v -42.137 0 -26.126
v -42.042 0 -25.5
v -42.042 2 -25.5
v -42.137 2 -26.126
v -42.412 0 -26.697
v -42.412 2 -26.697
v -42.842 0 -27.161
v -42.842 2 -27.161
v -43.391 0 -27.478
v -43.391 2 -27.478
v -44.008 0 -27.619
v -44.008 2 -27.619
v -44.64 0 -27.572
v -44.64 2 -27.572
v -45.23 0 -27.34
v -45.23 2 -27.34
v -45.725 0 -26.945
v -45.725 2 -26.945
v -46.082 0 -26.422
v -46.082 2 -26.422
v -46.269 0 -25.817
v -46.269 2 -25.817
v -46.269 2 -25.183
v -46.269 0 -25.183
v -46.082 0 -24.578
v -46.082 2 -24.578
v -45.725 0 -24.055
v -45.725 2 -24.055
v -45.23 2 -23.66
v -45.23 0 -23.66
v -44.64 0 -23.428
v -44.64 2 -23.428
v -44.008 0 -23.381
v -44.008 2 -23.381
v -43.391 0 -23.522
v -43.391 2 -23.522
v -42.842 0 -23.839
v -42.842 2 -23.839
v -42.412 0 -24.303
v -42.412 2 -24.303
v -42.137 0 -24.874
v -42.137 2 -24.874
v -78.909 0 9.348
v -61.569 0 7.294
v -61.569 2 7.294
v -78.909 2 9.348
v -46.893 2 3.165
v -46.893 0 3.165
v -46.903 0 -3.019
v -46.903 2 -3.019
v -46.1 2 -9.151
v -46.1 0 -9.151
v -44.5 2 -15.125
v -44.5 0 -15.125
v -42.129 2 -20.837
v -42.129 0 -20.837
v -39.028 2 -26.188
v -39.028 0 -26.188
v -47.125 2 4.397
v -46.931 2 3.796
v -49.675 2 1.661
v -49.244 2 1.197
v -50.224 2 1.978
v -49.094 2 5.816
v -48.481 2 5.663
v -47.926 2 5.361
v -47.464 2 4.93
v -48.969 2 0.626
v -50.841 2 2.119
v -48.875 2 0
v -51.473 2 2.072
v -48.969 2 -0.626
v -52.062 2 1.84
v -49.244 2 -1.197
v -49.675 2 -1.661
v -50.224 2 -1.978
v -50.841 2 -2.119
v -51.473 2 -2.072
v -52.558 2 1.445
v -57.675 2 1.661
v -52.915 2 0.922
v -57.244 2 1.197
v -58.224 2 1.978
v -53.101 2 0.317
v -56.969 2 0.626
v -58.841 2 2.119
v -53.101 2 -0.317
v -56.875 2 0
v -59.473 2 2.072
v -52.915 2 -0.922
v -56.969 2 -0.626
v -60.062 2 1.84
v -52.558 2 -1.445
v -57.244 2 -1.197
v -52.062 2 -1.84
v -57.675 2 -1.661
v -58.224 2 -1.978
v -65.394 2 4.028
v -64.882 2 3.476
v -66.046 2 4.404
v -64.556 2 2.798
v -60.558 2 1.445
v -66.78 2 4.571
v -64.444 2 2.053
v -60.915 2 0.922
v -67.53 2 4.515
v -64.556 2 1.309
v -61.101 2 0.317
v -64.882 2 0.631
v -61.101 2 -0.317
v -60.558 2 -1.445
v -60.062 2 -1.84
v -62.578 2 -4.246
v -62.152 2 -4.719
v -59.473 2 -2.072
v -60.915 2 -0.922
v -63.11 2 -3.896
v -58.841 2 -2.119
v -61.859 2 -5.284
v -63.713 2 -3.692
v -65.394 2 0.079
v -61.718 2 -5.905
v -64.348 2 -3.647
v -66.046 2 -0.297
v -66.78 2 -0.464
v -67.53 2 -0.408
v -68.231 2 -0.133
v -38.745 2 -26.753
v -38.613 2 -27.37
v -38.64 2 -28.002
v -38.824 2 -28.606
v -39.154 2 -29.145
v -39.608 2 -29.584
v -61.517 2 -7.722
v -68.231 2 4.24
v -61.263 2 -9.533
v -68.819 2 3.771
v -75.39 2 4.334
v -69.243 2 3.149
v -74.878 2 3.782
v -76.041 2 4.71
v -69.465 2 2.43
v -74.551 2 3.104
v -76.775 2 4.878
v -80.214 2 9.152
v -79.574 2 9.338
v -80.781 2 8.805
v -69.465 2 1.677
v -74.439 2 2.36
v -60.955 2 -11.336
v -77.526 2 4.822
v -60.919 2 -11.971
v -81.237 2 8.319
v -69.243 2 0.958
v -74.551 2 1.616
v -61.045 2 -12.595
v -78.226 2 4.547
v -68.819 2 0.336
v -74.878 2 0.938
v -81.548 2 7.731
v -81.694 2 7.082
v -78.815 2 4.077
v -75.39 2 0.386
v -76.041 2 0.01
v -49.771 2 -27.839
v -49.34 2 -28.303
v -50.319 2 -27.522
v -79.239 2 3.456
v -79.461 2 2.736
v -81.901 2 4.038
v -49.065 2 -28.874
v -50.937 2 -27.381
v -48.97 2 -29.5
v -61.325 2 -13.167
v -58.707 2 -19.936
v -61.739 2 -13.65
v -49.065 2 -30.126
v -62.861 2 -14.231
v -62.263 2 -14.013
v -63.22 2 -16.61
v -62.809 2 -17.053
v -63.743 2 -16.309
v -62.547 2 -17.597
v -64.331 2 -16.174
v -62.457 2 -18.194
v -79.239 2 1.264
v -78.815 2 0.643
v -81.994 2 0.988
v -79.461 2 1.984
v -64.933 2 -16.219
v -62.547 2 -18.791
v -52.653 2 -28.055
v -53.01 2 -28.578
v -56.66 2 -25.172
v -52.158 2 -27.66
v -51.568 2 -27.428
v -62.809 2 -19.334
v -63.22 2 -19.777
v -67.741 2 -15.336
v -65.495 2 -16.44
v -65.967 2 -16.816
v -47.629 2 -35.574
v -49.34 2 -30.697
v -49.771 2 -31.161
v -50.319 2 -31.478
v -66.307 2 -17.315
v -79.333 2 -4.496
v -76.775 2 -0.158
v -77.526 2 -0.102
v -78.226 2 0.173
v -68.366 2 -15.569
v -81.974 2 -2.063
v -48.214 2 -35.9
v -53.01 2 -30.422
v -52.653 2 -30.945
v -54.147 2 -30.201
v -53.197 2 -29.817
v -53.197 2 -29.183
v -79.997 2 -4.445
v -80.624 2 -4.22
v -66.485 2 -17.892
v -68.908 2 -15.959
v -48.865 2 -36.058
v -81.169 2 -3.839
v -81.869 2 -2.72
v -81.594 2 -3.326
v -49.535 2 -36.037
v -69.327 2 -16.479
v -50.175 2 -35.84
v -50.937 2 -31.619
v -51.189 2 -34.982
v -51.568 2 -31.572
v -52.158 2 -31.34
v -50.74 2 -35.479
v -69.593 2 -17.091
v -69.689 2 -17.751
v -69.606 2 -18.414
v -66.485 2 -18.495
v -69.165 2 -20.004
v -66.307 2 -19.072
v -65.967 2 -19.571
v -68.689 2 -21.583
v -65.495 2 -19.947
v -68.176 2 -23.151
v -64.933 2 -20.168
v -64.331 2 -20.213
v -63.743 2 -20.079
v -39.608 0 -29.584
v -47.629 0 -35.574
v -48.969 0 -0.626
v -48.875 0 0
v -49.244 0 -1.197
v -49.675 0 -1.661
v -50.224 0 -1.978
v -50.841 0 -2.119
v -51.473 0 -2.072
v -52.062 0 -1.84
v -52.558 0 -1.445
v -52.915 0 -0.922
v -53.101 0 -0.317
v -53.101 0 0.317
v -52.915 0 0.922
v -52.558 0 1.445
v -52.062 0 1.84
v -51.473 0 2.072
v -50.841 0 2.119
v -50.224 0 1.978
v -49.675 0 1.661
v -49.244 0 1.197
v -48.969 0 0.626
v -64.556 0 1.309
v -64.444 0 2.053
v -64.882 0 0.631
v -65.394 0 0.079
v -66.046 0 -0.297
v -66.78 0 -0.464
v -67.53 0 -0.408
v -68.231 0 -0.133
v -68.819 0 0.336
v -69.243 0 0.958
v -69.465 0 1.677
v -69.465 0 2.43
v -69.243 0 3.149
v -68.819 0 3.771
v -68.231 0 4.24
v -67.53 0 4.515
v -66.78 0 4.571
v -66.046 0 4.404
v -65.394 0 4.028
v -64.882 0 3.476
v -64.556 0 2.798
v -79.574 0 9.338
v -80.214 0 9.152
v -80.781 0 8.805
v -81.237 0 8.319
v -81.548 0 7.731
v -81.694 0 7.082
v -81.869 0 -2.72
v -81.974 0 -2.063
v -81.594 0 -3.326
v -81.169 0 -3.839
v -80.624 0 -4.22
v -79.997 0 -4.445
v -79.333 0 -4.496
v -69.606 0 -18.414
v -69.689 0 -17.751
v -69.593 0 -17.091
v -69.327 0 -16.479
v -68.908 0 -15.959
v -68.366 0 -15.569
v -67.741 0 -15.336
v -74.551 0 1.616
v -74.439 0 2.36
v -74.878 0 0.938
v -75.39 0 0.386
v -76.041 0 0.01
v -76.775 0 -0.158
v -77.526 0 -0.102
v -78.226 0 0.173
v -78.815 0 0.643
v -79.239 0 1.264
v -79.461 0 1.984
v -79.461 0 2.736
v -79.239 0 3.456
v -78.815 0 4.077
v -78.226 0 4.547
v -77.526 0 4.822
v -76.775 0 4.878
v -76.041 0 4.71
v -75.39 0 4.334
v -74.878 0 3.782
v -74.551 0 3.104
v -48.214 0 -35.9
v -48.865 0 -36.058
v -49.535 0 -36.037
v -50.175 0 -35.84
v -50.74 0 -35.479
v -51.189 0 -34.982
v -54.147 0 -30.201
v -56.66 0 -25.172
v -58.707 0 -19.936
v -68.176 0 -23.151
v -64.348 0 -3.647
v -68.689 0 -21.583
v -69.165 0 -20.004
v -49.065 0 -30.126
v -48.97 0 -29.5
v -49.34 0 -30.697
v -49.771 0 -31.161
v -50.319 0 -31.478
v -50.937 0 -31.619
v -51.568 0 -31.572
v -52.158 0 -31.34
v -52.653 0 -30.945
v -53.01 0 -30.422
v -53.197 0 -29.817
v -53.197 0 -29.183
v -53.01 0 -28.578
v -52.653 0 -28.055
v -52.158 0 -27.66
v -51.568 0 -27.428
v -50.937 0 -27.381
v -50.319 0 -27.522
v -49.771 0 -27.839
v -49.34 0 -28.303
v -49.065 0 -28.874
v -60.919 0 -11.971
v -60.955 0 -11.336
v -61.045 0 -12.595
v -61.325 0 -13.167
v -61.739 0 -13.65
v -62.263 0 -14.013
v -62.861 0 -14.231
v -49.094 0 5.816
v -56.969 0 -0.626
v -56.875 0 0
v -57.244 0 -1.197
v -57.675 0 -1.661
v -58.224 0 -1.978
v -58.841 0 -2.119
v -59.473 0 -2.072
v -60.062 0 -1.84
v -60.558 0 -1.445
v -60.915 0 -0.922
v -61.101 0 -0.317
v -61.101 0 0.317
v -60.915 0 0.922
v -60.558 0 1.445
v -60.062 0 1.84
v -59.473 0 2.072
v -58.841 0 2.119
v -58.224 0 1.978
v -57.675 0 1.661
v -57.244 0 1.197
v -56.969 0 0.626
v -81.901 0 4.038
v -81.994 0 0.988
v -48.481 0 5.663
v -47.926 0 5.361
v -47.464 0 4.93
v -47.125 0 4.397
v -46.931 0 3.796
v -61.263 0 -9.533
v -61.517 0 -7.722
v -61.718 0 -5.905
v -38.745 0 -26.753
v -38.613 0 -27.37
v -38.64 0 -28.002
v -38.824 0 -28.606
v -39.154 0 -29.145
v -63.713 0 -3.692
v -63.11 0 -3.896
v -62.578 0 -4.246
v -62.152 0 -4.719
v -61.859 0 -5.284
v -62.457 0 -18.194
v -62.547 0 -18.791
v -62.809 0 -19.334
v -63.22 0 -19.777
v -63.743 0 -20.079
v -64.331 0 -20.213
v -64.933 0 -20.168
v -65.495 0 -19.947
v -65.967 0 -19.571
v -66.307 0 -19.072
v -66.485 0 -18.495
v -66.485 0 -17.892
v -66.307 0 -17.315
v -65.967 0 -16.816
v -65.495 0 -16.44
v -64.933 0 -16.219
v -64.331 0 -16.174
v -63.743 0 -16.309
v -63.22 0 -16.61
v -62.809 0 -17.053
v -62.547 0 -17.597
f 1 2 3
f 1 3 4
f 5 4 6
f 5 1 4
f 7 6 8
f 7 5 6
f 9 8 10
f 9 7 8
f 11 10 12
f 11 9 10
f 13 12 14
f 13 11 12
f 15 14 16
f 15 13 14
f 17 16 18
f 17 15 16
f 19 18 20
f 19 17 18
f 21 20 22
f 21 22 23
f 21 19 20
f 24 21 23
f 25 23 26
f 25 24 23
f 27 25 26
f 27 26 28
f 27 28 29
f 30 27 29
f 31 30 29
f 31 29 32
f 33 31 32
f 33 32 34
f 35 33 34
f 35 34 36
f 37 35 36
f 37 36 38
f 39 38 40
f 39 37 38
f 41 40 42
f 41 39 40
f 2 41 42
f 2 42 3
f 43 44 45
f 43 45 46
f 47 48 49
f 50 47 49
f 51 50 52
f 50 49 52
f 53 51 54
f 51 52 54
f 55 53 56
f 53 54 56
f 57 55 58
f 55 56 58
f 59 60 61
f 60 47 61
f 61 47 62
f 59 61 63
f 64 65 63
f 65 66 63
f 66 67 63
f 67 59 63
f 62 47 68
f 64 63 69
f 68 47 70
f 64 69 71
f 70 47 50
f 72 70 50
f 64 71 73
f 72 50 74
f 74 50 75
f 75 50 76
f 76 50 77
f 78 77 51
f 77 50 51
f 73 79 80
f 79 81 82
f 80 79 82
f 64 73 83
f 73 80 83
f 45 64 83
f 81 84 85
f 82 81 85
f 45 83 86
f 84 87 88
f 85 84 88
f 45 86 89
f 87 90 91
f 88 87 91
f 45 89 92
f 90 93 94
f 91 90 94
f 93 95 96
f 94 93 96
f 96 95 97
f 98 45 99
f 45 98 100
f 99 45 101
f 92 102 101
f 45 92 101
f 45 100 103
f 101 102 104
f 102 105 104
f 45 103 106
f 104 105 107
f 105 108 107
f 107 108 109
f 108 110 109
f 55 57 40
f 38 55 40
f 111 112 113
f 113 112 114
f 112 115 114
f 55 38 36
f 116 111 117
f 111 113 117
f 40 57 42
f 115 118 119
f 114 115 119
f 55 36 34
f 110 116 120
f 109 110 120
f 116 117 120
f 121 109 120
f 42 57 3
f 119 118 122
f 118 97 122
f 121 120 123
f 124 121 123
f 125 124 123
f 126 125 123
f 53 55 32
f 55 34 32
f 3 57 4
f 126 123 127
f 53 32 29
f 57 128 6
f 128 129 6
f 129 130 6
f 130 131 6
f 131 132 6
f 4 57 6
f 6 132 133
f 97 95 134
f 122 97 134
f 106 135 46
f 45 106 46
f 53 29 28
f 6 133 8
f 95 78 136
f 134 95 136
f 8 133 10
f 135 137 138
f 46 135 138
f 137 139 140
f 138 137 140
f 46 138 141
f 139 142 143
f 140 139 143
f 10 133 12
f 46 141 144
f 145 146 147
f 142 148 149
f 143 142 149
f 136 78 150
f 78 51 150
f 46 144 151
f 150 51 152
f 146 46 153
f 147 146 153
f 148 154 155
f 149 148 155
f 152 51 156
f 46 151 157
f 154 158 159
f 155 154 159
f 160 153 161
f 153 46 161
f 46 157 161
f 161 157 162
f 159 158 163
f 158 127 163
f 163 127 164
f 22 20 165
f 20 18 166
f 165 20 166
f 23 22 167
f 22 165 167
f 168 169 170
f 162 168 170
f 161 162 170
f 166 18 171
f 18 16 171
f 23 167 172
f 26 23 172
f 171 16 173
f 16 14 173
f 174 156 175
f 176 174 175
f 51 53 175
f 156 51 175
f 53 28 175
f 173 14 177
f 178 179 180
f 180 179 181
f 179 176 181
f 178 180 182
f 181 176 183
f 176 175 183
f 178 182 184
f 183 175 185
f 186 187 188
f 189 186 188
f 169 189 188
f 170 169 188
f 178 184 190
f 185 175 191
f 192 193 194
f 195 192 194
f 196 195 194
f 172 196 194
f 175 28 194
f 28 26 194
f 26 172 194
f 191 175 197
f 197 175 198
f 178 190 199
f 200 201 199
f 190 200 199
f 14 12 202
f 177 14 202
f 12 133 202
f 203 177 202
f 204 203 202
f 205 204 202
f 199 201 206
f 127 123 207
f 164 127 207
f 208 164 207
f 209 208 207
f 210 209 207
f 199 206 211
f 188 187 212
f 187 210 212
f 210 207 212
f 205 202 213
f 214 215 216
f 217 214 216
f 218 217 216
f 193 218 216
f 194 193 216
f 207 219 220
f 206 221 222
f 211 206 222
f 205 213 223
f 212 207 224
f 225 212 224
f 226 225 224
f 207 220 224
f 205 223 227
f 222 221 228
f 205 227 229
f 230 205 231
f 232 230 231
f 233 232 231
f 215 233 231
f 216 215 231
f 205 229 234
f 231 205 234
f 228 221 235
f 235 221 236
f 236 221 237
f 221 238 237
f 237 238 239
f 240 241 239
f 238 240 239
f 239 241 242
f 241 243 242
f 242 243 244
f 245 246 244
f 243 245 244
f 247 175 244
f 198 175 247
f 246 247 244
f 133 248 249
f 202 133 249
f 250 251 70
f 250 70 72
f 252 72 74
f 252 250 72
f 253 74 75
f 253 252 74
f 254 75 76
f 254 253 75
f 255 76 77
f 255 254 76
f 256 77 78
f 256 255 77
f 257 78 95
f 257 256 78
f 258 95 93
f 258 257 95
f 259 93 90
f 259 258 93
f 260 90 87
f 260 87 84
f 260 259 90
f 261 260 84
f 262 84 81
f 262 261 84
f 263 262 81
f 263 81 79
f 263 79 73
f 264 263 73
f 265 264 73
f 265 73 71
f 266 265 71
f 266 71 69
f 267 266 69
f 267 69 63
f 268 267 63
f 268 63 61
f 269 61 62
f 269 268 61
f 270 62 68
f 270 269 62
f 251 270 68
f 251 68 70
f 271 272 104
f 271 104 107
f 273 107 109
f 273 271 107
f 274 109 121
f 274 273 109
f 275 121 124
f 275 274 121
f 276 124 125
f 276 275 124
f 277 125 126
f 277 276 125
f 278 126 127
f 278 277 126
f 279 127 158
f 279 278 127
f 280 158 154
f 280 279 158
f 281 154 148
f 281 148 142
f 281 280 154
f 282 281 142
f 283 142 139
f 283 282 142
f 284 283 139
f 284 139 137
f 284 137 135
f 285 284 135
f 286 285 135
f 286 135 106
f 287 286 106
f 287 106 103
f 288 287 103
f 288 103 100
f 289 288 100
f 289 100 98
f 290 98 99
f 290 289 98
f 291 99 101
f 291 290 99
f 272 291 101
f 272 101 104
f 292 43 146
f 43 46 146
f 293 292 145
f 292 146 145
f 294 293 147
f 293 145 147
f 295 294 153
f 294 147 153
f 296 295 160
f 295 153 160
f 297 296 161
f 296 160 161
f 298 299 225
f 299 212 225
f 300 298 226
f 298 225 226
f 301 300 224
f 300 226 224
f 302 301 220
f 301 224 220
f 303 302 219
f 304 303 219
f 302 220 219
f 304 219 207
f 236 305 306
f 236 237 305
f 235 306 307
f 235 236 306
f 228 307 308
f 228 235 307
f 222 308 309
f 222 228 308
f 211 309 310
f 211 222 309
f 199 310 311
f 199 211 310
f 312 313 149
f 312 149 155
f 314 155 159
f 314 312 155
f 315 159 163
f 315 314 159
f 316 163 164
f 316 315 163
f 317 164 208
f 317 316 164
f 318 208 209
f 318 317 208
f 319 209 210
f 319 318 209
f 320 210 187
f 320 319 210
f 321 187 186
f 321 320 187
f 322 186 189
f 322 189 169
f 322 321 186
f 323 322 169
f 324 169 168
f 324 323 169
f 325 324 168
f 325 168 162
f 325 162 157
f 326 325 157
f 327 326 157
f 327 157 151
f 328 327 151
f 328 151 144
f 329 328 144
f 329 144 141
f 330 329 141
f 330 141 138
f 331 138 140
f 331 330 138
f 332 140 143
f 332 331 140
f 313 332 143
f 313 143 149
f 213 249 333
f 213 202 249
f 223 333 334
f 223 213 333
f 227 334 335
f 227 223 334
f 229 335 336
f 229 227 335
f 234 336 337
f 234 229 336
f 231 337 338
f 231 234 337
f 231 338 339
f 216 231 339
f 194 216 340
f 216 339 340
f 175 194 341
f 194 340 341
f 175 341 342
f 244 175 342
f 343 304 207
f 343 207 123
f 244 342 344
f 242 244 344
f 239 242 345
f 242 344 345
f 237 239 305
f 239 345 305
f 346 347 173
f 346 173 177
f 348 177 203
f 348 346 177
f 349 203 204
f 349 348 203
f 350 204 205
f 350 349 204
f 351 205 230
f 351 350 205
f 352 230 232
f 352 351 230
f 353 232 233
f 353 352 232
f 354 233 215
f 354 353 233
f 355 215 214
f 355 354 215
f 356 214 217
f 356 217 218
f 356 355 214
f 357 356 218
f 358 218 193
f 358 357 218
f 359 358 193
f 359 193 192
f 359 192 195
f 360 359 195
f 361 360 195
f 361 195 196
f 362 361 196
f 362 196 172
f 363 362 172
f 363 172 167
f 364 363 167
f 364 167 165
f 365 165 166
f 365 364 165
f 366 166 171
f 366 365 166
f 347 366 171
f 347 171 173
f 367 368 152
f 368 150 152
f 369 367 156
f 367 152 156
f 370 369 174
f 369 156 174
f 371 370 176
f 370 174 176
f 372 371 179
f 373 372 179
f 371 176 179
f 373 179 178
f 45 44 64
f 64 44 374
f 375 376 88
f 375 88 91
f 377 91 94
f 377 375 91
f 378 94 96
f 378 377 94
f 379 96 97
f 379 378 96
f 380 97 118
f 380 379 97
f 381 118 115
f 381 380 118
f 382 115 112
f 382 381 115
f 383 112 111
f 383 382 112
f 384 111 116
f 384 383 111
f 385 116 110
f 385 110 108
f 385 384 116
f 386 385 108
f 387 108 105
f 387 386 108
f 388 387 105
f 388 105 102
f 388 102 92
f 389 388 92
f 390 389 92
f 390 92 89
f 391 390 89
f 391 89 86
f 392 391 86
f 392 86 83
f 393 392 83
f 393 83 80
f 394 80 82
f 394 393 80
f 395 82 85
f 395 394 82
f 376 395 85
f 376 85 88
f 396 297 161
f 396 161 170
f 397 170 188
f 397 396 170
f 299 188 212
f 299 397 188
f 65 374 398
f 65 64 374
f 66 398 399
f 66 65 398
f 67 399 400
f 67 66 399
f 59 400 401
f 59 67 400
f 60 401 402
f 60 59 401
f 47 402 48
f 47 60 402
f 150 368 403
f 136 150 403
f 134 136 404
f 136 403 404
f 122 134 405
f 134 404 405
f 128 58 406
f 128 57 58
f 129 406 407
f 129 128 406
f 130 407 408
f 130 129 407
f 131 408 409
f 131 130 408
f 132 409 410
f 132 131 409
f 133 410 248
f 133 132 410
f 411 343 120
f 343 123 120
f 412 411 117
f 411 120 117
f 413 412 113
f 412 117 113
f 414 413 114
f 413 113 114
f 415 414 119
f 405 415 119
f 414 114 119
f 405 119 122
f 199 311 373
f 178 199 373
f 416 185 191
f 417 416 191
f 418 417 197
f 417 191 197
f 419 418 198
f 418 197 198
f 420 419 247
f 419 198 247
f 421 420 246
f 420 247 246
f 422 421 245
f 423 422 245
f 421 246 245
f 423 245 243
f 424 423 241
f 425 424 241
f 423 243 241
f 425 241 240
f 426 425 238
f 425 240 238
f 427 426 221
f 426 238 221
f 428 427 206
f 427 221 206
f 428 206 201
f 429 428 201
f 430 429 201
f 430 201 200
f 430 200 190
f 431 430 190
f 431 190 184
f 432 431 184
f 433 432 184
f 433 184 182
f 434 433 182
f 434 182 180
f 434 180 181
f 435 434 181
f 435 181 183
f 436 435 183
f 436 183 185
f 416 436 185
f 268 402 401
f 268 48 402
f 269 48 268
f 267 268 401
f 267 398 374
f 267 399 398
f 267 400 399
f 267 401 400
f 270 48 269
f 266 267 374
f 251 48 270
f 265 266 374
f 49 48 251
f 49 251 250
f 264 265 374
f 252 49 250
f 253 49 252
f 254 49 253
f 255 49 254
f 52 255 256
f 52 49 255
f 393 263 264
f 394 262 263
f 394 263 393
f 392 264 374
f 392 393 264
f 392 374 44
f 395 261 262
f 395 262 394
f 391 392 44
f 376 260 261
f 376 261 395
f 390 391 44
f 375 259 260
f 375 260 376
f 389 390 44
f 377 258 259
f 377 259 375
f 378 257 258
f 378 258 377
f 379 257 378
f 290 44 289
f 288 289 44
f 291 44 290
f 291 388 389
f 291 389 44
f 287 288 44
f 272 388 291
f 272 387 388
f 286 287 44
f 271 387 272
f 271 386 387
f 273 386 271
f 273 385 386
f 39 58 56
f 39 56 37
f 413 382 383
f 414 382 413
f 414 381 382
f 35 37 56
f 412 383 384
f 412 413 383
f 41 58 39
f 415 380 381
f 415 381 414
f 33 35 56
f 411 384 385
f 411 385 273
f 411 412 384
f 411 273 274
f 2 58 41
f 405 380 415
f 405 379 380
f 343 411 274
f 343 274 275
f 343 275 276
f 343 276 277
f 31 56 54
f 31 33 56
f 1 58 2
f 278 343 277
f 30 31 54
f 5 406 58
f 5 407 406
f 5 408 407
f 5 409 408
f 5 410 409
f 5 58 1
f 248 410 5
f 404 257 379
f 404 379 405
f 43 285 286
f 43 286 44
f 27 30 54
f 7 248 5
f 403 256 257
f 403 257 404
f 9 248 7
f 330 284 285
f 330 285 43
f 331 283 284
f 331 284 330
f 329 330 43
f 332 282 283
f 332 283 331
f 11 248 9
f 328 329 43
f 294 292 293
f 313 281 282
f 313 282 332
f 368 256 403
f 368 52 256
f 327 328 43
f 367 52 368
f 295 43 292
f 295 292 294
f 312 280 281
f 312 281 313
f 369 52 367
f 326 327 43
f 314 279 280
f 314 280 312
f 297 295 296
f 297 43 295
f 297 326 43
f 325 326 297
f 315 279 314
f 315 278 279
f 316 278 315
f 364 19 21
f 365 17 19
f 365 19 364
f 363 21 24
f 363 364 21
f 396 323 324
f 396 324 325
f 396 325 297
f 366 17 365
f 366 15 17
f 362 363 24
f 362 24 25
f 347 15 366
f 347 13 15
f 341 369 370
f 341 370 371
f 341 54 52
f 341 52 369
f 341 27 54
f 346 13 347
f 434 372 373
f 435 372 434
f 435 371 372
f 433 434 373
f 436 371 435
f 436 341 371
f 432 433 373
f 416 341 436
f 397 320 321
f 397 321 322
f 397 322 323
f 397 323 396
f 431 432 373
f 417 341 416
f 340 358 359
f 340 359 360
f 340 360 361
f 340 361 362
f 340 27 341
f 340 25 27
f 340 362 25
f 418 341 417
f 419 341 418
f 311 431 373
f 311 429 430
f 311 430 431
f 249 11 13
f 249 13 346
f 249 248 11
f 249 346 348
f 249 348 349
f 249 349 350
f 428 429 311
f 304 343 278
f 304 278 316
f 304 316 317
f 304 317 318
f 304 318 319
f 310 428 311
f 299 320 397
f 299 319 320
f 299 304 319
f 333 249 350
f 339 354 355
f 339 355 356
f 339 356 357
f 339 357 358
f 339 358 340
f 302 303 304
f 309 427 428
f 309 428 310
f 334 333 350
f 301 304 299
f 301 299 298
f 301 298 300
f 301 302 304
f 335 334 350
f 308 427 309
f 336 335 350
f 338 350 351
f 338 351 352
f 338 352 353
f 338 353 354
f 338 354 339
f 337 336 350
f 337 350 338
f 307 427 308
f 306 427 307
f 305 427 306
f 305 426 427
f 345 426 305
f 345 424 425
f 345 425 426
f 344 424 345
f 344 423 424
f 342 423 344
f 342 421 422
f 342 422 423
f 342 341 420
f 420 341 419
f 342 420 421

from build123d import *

# Parameters (mm, degrees)
SKETCH1_R               = 2.125
BOSS_EXTRUDE1_DEPTH     = 2
BOSS_EXTRUDE3_DEPTH     = 2
SKETCH4_R               = 2.025
CUT_EXTRUDE1_DEPTH      = 1
CUT_EXTRUDE1_DEPTH_BACK = 3
SKETCH6_R               = 2.525
BOSS_EXTRUDE4_DEPTH     = 2
FILLET1_R               = 2.5


with BuildPart() as part:
    # Sketch1 → Boss-Extrude1 (new body)
    with BuildSketch(Plane(origin=(0, 0, 0), x_dir=(1, 0, 0), z_dir=(0, 1, 0))):
        with BuildLine():
            Line((-37.655823606, 28.125414637), (-49.673639651, 37.101610798))
            ThreePointArc((-49.673639651, 37.101610798), (-59.88740123, 16.046780796), (-61.569439235, -7.294117647))
            Line((-61.569439235, -7.294117647), (-46.673607162, -5.529411765))
            ThreePointArc((-46.673607162, -5.529411765), (-45.398513836, 12.16449512), (-37.655823606, 28.125414637))
        make_face()
        with Locations((-44.167295593, 25.5)):
            Circle(SKETCH1_R, mode=Mode.SUBTRACT)
        with Locations((-51.095498823, 29.5)):
            Circle(SKETCH1_R, mode=Mode.SUBTRACT)
        with Locations((-59, 0)):
            Circle(SKETCH1_R, mode=Mode.SUBTRACT)
        with Locations((-51, 0)):
            Circle(SKETCH1_R, mode=Mode.SUBTRACT)
    extrude(amount=BOSS_EXTRUDE1_DEPTH)

    # Sketch3 → Boss-Extrude3 (add)
    with BuildSketch(Plane(origin=(0, 0, 0), x_dir=(1, 0, 0), z_dir=(0, 1, 0))):
        with BuildLine():
            Line((-70.222891931, 15.897969958), (-60.469712497, 13.689918575))
            ThreePointArc((-60.469712497, 13.689918575), (-59.670365878, 16.835897245), (-58.707466934, 19.93572989))
            Line((-58.707466934, 19.93572989), (-68.176413213, 23.151170195))
            ThreePointArc((-68.176413213, 23.151170195), (-69.294618439, 19.551364542), (-70.222891931, 15.897969958))
        make_face()
    extrude(amount=BOSS_EXTRUDE3_DEPTH)

    # Sketch4 → Cut-Extrude1 (cut, two sides)
    with BuildSketch(Plane(origin=(0, 2, 0), x_dir=(1, 0, 0), z_dir=(0, 1, 0))) as cut_extrude1_sk:
        with Locations((-64.482492158, 18.193630893)):
            Circle(SKETCH4_R)
    extrude(amount=CUT_EXTRUDE1_DEPTH, mode=Mode.SUBTRACT)
    extrude(cut_extrude1_sk.sketch, amount=-CUT_EXTRUDE1_DEPTH_BACK, mode=Mode.SUBTRACT)

    # Sketch6 → Boss-Extrude4 (add)
    with BuildSketch(Plane(origin=(0, 0, 0), x_dir=(1, 0, 0), z_dir=(0, 1, 0))):
        with BuildLine():
            Line((-61.569439235, -7.294117647), (-81.430548666, -9.647058824))
            ThreePointArc((-81.430548666, -9.647058824), (-81.961477421, -2.513208901), (-81.868629843, 4.639768059))
            Line((-81.868629843, 4.639768059), (-61.900671345, 3.508117313))
            ThreePointArc((-61.900671345, 3.508117313), (-61.970873172, -1.90023112), (-61.569439235, -7.294117647))
        make_face()
        with Locations((-76.963826359, -2.359964456)):
            Circle(SKETCH6_R, mode=Mode.SUBTRACT)
        with Locations((-66.968524234, -2.053475565)):
            Circle(SKETCH6_R, mode=Mode.SUBTRACT)
    extrude(amount=BOSS_EXTRUDE4_DEPTH)

    # Fillet1
    fillet1_edges = [part.edges().sort_by_distance(p)[0] for p in [
        (-60.469712497, 1, -13.689918575),
        (-70.222891931, 1, -15.897969958),
        (-81.430548666, 1, 9.647058824),
        (-81.868629843, 1, -4.639768059),
        (-61.900671345, 1, -3.508117313),
        (-46.673607162, 1, 5.529411765),
        (-49.673639651, 1, -37.101610798),
        (-37.655823606, 1, -28.125414637),
    ]]
    fillet(fillet1_edges, radius=FILLET1_R)


solid = part.part
